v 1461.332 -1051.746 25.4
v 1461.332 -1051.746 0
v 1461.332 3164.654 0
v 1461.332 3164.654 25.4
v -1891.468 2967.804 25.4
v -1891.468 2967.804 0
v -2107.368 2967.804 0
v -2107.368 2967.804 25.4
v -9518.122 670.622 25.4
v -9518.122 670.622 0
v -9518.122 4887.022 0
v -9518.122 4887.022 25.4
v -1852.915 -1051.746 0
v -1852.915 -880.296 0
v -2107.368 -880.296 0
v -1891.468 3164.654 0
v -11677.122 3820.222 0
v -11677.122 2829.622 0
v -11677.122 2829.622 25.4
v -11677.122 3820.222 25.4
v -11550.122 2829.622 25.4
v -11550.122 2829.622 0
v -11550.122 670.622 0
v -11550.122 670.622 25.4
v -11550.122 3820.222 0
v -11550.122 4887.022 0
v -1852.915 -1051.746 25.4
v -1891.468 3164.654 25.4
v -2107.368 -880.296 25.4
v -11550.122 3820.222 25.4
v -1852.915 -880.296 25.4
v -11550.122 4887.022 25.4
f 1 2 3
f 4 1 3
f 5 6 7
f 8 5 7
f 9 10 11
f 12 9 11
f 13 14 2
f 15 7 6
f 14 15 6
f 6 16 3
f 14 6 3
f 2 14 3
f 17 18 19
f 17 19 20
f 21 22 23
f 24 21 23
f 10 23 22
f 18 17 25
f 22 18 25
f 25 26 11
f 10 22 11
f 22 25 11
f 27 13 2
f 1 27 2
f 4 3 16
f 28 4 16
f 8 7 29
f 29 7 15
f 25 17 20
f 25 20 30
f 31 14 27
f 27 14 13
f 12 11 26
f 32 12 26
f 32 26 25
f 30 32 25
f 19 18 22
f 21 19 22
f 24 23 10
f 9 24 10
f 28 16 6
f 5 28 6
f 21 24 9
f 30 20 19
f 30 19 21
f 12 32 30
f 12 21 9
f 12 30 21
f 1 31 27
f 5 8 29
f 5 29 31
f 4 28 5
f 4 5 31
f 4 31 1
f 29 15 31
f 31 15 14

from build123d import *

# Parameters (mm, degrees)
F1_DEPTH = 25.4
F0_W     = 127
F0_H     = 990.6
F2_DEPTH = 25.4


with BuildPart() as f1:
    # F0 (on Top) → F1 (new body)
    with BuildSketch(Plane.XY):
        Polygon((-1852.91452, -880.295991), (-1852.91452, -1051.745991), (1461.331901, -1051.745991), (1461.331901, 1107.254009), (1461.331901, 2097.854009), (1461.331901, 3164.654009), (-1891.468099, 3164.654009), (-1891.468099, 2967.804009), (-2107.368099, 2967.804009), (-2107.368099, -880.295991), align=None)
    extrude(amount=F1_DEPTH)


with BuildPart() as f2:
    # F0 (on Top) → F2 (new body)
    with BuildSketch(Plane.XY):
        Polygon((-11550.122358, 4887.022448), (-11550.122358, 3820.222448), (-11550.122358, 2829.622448), (-11550.122358, 670.622448), (-9518.122358, 670.622448), (-9518.122358, 4887.022448), align=None)
        with Locations((-11613.622358, 3324.922448)):
            Rectangle(F0_W, F0_H)
    extrude(amount=F2_DEPTH)


solid = Compound([f1.part, f2.part])
